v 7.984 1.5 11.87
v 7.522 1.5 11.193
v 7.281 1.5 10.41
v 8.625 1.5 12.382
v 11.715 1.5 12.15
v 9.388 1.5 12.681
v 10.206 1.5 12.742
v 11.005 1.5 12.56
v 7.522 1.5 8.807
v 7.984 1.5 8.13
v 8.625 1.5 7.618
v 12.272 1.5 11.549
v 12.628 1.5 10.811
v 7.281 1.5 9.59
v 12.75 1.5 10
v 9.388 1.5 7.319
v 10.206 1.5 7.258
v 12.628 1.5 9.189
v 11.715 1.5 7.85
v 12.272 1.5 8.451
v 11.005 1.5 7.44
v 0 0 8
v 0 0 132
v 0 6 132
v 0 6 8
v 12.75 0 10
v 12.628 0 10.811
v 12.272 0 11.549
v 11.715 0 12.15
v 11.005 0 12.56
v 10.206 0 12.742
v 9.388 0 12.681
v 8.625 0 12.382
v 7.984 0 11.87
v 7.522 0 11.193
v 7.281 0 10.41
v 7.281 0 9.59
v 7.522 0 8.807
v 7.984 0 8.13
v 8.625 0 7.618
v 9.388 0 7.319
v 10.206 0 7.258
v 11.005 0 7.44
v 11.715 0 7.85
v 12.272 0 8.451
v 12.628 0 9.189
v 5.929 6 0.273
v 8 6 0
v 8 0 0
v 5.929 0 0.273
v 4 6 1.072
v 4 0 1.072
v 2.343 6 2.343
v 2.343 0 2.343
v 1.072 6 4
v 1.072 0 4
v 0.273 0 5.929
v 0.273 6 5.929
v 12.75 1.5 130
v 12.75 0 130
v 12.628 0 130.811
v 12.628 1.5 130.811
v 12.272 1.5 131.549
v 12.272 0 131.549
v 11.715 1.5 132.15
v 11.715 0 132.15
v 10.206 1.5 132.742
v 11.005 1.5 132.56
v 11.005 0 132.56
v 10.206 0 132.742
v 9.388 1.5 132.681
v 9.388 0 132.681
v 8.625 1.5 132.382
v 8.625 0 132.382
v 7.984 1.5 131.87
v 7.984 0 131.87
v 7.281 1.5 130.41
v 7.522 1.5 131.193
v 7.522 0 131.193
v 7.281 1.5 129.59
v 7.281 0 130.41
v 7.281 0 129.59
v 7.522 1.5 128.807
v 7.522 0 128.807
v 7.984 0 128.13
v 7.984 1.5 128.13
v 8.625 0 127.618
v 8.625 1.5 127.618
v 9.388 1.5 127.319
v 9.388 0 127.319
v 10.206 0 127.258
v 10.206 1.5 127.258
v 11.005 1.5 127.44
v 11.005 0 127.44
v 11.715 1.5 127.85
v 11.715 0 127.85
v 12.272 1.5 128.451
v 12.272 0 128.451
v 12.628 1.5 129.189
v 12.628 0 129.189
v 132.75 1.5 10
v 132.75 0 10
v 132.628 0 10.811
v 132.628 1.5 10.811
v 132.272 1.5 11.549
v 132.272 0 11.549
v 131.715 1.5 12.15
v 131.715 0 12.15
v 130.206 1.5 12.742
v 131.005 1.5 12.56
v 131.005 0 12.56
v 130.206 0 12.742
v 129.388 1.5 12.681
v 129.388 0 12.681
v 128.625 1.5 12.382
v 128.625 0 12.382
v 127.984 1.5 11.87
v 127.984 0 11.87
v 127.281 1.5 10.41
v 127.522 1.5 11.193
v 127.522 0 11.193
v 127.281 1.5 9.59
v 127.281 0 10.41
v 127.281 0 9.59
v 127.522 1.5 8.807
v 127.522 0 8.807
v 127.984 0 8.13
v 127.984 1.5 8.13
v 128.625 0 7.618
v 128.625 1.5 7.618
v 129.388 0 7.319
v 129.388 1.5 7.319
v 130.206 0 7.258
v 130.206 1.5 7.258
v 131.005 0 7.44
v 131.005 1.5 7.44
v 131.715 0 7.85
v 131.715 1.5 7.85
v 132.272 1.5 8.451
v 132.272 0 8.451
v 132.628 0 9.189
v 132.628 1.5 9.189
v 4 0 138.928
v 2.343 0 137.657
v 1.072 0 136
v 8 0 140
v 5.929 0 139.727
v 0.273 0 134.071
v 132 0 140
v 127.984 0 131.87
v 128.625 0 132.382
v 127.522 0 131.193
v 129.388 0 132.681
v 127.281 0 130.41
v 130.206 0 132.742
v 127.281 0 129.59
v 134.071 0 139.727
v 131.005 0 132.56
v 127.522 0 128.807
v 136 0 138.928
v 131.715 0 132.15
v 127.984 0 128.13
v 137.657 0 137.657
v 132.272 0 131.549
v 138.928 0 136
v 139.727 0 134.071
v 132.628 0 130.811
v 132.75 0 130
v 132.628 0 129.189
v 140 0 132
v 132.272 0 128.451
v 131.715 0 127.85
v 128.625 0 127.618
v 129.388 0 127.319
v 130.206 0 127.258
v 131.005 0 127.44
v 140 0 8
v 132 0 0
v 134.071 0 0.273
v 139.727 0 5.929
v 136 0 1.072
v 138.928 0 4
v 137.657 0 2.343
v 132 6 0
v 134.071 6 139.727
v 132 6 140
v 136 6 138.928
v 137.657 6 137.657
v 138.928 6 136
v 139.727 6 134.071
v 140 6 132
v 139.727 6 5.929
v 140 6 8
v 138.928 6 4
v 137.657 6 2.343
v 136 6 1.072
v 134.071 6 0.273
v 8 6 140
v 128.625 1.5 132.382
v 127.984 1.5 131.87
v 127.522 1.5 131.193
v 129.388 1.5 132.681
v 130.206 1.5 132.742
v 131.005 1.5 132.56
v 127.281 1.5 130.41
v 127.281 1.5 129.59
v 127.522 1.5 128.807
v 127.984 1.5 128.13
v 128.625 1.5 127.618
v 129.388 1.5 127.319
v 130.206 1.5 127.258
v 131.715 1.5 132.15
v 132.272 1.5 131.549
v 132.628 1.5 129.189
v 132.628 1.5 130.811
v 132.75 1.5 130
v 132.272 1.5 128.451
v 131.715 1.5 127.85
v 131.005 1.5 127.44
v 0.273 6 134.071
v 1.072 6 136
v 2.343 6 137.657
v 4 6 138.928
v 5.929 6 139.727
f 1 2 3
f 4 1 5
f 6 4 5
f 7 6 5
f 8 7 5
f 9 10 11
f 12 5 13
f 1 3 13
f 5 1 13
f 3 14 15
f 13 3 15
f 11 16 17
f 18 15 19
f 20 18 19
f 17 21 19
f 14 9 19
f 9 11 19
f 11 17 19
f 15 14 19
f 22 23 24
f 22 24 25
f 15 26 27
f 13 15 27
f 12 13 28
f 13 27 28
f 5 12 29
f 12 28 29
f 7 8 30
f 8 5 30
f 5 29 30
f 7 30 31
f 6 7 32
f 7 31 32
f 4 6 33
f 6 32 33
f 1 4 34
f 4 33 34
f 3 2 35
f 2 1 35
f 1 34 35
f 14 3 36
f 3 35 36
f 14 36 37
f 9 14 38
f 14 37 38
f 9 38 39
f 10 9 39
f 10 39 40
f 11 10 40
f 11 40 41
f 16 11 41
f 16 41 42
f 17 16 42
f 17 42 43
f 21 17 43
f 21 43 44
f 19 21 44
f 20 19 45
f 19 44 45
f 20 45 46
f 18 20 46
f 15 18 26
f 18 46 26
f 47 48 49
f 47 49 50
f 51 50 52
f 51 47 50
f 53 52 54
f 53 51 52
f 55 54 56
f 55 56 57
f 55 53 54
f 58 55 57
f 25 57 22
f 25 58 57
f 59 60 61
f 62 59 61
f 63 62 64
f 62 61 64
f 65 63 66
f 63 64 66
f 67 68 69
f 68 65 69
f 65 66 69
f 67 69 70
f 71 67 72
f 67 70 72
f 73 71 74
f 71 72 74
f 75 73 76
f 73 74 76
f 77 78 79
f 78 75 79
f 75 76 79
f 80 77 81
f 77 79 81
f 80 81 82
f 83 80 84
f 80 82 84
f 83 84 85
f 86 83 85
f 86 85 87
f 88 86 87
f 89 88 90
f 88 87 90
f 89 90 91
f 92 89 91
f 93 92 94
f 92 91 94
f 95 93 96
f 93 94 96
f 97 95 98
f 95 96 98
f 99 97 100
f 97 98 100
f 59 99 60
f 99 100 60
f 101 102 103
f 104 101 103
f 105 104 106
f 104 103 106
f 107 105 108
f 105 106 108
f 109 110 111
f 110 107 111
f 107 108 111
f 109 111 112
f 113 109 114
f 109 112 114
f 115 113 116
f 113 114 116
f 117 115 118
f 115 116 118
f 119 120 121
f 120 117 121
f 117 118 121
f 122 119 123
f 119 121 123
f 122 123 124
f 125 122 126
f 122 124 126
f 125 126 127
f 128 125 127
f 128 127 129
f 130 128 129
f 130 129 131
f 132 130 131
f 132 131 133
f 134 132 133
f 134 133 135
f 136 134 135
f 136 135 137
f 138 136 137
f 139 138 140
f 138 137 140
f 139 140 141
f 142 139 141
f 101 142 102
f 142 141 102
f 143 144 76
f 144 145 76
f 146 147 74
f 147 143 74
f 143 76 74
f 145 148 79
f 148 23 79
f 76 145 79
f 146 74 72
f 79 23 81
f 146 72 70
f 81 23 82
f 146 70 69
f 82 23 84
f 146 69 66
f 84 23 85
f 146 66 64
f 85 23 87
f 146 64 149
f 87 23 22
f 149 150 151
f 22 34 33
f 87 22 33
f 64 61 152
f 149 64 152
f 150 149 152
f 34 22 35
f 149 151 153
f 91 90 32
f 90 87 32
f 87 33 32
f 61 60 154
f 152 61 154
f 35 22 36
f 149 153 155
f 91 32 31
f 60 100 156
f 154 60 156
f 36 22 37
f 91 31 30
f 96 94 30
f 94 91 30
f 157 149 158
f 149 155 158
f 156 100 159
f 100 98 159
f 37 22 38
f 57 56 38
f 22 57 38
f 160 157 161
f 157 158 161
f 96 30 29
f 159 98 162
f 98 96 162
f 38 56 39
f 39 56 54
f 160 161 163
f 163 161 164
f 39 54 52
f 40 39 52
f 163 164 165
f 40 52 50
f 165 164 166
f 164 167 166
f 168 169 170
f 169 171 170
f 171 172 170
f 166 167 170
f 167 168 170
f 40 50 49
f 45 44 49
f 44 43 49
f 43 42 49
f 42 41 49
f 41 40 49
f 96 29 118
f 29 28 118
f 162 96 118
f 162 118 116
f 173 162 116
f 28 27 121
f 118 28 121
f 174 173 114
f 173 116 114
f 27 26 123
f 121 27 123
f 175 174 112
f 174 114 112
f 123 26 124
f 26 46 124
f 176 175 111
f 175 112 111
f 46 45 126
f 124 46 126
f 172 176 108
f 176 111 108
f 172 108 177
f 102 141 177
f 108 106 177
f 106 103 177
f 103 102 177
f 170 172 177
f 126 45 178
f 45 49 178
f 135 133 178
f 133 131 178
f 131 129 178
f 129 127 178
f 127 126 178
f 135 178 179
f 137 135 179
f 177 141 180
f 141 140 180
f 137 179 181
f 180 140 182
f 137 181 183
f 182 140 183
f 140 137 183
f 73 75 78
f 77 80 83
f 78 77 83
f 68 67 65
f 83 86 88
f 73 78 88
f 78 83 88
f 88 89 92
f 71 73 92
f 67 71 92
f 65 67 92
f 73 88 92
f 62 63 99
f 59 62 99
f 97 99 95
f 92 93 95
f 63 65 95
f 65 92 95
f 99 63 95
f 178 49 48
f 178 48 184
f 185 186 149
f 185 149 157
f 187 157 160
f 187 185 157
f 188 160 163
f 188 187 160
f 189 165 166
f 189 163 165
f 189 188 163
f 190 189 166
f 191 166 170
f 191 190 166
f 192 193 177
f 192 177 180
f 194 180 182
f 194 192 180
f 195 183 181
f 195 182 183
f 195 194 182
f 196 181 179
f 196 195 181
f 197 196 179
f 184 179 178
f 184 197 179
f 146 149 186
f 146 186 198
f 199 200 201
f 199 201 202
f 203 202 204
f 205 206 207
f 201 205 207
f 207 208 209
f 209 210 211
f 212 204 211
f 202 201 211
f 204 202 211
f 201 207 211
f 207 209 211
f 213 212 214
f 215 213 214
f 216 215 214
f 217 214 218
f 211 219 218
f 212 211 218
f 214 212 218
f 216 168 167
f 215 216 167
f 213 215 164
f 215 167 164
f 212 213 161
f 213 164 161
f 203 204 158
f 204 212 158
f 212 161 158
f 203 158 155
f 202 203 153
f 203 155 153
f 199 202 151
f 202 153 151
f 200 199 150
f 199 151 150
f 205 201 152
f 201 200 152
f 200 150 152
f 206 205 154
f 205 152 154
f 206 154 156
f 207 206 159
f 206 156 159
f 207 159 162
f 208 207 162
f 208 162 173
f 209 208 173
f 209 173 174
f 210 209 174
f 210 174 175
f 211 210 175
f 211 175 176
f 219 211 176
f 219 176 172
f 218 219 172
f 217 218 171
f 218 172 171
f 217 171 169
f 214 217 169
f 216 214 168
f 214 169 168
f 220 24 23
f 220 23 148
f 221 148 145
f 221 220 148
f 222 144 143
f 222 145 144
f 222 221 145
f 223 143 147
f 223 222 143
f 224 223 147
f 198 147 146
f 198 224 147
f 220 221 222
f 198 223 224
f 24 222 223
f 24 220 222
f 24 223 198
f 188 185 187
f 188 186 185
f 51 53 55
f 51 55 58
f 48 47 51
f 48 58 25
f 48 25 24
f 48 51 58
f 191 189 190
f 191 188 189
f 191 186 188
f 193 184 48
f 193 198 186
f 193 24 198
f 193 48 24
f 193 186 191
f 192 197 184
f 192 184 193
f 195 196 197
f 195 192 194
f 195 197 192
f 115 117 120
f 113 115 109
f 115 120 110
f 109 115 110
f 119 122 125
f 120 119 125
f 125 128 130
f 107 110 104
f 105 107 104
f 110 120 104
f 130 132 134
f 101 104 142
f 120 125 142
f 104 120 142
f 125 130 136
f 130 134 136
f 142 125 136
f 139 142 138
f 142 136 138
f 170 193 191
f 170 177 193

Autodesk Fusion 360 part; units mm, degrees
sketch "Bottom Access Panel" plane through (0, 0, 0) normal (0, 1, 0) x (1, 0, 0)
  line L0 (0, 0) -> (140, 0)
  line L1 (140, 0) -> (140, -140)
  line L2 (140, -140) -> (0, -140)
  line L3 (0, -140) -> (0, 0)
  dimension "d1" = 140
  dimension "d2" = 140
extrude "Extrude1" add sketch "Bottom Access Panel" along normal blind 6
fillet "Fillet1" radius 8 4 edges at (0, 3, 140) (140, 3, 140) (140, 3, 0) (0, 3, 0)
sketch "Magnet Holes" plane through (0, 0, 0) normal (0, 1, 0) x (1, 0, 0)
  arc A0 (8, 0) -> (0, -8) centre (8, -8) ccw
  line L0 (8, 0) -> (132, 0)
  arc A1 (140, -8) -> (132, 0) centre (132, -8) ccw
  line L1 (140, -8) -> (140, -132)
  arc A2 (132, -140) -> (140, -132) centre (132, -132) ccw
  line L2 (132, -140) -> (8, -140)
  arc A3 (0, -132) -> (8, -140) centre (8, -132) ccw
  line L3 (0, -132) -> (0, -8)
  circle A4 centre (10, -130) radius 2.75
  circle A5 centre (130, -130) radius 2.75
  circle A6 centre (10, -10) radius 2.75
  circle A7 centre (130, -10) radius 2.75
  dimension "d20" = 5.5
  dimension "d21" = 5.5
  dimension "d22" = 5.5
  dimension "d23" = 5.5
  dimension "d24" = 10
  dimension "d25" = 10
  dimension "d26" = 10
  dimension "d27" = 10
  dimension "d28" = 10
  dimension "d29" = 10
  dimension "d30" = 10
  dimension "d31" = 10
extrude "Extrude3" cut sketch "Magnet Holes" along normal blind 1.5 contours A4 | A5 | A6 | A7
equation "mdfThickness = 6 mm" comment "Thickness of the MDF fibre board"
equation "d4 = mdfThickness"
equation "filletRadius = 8 mm" comment "Radius to use for fillets"
equation "d15 = filletRadius"
